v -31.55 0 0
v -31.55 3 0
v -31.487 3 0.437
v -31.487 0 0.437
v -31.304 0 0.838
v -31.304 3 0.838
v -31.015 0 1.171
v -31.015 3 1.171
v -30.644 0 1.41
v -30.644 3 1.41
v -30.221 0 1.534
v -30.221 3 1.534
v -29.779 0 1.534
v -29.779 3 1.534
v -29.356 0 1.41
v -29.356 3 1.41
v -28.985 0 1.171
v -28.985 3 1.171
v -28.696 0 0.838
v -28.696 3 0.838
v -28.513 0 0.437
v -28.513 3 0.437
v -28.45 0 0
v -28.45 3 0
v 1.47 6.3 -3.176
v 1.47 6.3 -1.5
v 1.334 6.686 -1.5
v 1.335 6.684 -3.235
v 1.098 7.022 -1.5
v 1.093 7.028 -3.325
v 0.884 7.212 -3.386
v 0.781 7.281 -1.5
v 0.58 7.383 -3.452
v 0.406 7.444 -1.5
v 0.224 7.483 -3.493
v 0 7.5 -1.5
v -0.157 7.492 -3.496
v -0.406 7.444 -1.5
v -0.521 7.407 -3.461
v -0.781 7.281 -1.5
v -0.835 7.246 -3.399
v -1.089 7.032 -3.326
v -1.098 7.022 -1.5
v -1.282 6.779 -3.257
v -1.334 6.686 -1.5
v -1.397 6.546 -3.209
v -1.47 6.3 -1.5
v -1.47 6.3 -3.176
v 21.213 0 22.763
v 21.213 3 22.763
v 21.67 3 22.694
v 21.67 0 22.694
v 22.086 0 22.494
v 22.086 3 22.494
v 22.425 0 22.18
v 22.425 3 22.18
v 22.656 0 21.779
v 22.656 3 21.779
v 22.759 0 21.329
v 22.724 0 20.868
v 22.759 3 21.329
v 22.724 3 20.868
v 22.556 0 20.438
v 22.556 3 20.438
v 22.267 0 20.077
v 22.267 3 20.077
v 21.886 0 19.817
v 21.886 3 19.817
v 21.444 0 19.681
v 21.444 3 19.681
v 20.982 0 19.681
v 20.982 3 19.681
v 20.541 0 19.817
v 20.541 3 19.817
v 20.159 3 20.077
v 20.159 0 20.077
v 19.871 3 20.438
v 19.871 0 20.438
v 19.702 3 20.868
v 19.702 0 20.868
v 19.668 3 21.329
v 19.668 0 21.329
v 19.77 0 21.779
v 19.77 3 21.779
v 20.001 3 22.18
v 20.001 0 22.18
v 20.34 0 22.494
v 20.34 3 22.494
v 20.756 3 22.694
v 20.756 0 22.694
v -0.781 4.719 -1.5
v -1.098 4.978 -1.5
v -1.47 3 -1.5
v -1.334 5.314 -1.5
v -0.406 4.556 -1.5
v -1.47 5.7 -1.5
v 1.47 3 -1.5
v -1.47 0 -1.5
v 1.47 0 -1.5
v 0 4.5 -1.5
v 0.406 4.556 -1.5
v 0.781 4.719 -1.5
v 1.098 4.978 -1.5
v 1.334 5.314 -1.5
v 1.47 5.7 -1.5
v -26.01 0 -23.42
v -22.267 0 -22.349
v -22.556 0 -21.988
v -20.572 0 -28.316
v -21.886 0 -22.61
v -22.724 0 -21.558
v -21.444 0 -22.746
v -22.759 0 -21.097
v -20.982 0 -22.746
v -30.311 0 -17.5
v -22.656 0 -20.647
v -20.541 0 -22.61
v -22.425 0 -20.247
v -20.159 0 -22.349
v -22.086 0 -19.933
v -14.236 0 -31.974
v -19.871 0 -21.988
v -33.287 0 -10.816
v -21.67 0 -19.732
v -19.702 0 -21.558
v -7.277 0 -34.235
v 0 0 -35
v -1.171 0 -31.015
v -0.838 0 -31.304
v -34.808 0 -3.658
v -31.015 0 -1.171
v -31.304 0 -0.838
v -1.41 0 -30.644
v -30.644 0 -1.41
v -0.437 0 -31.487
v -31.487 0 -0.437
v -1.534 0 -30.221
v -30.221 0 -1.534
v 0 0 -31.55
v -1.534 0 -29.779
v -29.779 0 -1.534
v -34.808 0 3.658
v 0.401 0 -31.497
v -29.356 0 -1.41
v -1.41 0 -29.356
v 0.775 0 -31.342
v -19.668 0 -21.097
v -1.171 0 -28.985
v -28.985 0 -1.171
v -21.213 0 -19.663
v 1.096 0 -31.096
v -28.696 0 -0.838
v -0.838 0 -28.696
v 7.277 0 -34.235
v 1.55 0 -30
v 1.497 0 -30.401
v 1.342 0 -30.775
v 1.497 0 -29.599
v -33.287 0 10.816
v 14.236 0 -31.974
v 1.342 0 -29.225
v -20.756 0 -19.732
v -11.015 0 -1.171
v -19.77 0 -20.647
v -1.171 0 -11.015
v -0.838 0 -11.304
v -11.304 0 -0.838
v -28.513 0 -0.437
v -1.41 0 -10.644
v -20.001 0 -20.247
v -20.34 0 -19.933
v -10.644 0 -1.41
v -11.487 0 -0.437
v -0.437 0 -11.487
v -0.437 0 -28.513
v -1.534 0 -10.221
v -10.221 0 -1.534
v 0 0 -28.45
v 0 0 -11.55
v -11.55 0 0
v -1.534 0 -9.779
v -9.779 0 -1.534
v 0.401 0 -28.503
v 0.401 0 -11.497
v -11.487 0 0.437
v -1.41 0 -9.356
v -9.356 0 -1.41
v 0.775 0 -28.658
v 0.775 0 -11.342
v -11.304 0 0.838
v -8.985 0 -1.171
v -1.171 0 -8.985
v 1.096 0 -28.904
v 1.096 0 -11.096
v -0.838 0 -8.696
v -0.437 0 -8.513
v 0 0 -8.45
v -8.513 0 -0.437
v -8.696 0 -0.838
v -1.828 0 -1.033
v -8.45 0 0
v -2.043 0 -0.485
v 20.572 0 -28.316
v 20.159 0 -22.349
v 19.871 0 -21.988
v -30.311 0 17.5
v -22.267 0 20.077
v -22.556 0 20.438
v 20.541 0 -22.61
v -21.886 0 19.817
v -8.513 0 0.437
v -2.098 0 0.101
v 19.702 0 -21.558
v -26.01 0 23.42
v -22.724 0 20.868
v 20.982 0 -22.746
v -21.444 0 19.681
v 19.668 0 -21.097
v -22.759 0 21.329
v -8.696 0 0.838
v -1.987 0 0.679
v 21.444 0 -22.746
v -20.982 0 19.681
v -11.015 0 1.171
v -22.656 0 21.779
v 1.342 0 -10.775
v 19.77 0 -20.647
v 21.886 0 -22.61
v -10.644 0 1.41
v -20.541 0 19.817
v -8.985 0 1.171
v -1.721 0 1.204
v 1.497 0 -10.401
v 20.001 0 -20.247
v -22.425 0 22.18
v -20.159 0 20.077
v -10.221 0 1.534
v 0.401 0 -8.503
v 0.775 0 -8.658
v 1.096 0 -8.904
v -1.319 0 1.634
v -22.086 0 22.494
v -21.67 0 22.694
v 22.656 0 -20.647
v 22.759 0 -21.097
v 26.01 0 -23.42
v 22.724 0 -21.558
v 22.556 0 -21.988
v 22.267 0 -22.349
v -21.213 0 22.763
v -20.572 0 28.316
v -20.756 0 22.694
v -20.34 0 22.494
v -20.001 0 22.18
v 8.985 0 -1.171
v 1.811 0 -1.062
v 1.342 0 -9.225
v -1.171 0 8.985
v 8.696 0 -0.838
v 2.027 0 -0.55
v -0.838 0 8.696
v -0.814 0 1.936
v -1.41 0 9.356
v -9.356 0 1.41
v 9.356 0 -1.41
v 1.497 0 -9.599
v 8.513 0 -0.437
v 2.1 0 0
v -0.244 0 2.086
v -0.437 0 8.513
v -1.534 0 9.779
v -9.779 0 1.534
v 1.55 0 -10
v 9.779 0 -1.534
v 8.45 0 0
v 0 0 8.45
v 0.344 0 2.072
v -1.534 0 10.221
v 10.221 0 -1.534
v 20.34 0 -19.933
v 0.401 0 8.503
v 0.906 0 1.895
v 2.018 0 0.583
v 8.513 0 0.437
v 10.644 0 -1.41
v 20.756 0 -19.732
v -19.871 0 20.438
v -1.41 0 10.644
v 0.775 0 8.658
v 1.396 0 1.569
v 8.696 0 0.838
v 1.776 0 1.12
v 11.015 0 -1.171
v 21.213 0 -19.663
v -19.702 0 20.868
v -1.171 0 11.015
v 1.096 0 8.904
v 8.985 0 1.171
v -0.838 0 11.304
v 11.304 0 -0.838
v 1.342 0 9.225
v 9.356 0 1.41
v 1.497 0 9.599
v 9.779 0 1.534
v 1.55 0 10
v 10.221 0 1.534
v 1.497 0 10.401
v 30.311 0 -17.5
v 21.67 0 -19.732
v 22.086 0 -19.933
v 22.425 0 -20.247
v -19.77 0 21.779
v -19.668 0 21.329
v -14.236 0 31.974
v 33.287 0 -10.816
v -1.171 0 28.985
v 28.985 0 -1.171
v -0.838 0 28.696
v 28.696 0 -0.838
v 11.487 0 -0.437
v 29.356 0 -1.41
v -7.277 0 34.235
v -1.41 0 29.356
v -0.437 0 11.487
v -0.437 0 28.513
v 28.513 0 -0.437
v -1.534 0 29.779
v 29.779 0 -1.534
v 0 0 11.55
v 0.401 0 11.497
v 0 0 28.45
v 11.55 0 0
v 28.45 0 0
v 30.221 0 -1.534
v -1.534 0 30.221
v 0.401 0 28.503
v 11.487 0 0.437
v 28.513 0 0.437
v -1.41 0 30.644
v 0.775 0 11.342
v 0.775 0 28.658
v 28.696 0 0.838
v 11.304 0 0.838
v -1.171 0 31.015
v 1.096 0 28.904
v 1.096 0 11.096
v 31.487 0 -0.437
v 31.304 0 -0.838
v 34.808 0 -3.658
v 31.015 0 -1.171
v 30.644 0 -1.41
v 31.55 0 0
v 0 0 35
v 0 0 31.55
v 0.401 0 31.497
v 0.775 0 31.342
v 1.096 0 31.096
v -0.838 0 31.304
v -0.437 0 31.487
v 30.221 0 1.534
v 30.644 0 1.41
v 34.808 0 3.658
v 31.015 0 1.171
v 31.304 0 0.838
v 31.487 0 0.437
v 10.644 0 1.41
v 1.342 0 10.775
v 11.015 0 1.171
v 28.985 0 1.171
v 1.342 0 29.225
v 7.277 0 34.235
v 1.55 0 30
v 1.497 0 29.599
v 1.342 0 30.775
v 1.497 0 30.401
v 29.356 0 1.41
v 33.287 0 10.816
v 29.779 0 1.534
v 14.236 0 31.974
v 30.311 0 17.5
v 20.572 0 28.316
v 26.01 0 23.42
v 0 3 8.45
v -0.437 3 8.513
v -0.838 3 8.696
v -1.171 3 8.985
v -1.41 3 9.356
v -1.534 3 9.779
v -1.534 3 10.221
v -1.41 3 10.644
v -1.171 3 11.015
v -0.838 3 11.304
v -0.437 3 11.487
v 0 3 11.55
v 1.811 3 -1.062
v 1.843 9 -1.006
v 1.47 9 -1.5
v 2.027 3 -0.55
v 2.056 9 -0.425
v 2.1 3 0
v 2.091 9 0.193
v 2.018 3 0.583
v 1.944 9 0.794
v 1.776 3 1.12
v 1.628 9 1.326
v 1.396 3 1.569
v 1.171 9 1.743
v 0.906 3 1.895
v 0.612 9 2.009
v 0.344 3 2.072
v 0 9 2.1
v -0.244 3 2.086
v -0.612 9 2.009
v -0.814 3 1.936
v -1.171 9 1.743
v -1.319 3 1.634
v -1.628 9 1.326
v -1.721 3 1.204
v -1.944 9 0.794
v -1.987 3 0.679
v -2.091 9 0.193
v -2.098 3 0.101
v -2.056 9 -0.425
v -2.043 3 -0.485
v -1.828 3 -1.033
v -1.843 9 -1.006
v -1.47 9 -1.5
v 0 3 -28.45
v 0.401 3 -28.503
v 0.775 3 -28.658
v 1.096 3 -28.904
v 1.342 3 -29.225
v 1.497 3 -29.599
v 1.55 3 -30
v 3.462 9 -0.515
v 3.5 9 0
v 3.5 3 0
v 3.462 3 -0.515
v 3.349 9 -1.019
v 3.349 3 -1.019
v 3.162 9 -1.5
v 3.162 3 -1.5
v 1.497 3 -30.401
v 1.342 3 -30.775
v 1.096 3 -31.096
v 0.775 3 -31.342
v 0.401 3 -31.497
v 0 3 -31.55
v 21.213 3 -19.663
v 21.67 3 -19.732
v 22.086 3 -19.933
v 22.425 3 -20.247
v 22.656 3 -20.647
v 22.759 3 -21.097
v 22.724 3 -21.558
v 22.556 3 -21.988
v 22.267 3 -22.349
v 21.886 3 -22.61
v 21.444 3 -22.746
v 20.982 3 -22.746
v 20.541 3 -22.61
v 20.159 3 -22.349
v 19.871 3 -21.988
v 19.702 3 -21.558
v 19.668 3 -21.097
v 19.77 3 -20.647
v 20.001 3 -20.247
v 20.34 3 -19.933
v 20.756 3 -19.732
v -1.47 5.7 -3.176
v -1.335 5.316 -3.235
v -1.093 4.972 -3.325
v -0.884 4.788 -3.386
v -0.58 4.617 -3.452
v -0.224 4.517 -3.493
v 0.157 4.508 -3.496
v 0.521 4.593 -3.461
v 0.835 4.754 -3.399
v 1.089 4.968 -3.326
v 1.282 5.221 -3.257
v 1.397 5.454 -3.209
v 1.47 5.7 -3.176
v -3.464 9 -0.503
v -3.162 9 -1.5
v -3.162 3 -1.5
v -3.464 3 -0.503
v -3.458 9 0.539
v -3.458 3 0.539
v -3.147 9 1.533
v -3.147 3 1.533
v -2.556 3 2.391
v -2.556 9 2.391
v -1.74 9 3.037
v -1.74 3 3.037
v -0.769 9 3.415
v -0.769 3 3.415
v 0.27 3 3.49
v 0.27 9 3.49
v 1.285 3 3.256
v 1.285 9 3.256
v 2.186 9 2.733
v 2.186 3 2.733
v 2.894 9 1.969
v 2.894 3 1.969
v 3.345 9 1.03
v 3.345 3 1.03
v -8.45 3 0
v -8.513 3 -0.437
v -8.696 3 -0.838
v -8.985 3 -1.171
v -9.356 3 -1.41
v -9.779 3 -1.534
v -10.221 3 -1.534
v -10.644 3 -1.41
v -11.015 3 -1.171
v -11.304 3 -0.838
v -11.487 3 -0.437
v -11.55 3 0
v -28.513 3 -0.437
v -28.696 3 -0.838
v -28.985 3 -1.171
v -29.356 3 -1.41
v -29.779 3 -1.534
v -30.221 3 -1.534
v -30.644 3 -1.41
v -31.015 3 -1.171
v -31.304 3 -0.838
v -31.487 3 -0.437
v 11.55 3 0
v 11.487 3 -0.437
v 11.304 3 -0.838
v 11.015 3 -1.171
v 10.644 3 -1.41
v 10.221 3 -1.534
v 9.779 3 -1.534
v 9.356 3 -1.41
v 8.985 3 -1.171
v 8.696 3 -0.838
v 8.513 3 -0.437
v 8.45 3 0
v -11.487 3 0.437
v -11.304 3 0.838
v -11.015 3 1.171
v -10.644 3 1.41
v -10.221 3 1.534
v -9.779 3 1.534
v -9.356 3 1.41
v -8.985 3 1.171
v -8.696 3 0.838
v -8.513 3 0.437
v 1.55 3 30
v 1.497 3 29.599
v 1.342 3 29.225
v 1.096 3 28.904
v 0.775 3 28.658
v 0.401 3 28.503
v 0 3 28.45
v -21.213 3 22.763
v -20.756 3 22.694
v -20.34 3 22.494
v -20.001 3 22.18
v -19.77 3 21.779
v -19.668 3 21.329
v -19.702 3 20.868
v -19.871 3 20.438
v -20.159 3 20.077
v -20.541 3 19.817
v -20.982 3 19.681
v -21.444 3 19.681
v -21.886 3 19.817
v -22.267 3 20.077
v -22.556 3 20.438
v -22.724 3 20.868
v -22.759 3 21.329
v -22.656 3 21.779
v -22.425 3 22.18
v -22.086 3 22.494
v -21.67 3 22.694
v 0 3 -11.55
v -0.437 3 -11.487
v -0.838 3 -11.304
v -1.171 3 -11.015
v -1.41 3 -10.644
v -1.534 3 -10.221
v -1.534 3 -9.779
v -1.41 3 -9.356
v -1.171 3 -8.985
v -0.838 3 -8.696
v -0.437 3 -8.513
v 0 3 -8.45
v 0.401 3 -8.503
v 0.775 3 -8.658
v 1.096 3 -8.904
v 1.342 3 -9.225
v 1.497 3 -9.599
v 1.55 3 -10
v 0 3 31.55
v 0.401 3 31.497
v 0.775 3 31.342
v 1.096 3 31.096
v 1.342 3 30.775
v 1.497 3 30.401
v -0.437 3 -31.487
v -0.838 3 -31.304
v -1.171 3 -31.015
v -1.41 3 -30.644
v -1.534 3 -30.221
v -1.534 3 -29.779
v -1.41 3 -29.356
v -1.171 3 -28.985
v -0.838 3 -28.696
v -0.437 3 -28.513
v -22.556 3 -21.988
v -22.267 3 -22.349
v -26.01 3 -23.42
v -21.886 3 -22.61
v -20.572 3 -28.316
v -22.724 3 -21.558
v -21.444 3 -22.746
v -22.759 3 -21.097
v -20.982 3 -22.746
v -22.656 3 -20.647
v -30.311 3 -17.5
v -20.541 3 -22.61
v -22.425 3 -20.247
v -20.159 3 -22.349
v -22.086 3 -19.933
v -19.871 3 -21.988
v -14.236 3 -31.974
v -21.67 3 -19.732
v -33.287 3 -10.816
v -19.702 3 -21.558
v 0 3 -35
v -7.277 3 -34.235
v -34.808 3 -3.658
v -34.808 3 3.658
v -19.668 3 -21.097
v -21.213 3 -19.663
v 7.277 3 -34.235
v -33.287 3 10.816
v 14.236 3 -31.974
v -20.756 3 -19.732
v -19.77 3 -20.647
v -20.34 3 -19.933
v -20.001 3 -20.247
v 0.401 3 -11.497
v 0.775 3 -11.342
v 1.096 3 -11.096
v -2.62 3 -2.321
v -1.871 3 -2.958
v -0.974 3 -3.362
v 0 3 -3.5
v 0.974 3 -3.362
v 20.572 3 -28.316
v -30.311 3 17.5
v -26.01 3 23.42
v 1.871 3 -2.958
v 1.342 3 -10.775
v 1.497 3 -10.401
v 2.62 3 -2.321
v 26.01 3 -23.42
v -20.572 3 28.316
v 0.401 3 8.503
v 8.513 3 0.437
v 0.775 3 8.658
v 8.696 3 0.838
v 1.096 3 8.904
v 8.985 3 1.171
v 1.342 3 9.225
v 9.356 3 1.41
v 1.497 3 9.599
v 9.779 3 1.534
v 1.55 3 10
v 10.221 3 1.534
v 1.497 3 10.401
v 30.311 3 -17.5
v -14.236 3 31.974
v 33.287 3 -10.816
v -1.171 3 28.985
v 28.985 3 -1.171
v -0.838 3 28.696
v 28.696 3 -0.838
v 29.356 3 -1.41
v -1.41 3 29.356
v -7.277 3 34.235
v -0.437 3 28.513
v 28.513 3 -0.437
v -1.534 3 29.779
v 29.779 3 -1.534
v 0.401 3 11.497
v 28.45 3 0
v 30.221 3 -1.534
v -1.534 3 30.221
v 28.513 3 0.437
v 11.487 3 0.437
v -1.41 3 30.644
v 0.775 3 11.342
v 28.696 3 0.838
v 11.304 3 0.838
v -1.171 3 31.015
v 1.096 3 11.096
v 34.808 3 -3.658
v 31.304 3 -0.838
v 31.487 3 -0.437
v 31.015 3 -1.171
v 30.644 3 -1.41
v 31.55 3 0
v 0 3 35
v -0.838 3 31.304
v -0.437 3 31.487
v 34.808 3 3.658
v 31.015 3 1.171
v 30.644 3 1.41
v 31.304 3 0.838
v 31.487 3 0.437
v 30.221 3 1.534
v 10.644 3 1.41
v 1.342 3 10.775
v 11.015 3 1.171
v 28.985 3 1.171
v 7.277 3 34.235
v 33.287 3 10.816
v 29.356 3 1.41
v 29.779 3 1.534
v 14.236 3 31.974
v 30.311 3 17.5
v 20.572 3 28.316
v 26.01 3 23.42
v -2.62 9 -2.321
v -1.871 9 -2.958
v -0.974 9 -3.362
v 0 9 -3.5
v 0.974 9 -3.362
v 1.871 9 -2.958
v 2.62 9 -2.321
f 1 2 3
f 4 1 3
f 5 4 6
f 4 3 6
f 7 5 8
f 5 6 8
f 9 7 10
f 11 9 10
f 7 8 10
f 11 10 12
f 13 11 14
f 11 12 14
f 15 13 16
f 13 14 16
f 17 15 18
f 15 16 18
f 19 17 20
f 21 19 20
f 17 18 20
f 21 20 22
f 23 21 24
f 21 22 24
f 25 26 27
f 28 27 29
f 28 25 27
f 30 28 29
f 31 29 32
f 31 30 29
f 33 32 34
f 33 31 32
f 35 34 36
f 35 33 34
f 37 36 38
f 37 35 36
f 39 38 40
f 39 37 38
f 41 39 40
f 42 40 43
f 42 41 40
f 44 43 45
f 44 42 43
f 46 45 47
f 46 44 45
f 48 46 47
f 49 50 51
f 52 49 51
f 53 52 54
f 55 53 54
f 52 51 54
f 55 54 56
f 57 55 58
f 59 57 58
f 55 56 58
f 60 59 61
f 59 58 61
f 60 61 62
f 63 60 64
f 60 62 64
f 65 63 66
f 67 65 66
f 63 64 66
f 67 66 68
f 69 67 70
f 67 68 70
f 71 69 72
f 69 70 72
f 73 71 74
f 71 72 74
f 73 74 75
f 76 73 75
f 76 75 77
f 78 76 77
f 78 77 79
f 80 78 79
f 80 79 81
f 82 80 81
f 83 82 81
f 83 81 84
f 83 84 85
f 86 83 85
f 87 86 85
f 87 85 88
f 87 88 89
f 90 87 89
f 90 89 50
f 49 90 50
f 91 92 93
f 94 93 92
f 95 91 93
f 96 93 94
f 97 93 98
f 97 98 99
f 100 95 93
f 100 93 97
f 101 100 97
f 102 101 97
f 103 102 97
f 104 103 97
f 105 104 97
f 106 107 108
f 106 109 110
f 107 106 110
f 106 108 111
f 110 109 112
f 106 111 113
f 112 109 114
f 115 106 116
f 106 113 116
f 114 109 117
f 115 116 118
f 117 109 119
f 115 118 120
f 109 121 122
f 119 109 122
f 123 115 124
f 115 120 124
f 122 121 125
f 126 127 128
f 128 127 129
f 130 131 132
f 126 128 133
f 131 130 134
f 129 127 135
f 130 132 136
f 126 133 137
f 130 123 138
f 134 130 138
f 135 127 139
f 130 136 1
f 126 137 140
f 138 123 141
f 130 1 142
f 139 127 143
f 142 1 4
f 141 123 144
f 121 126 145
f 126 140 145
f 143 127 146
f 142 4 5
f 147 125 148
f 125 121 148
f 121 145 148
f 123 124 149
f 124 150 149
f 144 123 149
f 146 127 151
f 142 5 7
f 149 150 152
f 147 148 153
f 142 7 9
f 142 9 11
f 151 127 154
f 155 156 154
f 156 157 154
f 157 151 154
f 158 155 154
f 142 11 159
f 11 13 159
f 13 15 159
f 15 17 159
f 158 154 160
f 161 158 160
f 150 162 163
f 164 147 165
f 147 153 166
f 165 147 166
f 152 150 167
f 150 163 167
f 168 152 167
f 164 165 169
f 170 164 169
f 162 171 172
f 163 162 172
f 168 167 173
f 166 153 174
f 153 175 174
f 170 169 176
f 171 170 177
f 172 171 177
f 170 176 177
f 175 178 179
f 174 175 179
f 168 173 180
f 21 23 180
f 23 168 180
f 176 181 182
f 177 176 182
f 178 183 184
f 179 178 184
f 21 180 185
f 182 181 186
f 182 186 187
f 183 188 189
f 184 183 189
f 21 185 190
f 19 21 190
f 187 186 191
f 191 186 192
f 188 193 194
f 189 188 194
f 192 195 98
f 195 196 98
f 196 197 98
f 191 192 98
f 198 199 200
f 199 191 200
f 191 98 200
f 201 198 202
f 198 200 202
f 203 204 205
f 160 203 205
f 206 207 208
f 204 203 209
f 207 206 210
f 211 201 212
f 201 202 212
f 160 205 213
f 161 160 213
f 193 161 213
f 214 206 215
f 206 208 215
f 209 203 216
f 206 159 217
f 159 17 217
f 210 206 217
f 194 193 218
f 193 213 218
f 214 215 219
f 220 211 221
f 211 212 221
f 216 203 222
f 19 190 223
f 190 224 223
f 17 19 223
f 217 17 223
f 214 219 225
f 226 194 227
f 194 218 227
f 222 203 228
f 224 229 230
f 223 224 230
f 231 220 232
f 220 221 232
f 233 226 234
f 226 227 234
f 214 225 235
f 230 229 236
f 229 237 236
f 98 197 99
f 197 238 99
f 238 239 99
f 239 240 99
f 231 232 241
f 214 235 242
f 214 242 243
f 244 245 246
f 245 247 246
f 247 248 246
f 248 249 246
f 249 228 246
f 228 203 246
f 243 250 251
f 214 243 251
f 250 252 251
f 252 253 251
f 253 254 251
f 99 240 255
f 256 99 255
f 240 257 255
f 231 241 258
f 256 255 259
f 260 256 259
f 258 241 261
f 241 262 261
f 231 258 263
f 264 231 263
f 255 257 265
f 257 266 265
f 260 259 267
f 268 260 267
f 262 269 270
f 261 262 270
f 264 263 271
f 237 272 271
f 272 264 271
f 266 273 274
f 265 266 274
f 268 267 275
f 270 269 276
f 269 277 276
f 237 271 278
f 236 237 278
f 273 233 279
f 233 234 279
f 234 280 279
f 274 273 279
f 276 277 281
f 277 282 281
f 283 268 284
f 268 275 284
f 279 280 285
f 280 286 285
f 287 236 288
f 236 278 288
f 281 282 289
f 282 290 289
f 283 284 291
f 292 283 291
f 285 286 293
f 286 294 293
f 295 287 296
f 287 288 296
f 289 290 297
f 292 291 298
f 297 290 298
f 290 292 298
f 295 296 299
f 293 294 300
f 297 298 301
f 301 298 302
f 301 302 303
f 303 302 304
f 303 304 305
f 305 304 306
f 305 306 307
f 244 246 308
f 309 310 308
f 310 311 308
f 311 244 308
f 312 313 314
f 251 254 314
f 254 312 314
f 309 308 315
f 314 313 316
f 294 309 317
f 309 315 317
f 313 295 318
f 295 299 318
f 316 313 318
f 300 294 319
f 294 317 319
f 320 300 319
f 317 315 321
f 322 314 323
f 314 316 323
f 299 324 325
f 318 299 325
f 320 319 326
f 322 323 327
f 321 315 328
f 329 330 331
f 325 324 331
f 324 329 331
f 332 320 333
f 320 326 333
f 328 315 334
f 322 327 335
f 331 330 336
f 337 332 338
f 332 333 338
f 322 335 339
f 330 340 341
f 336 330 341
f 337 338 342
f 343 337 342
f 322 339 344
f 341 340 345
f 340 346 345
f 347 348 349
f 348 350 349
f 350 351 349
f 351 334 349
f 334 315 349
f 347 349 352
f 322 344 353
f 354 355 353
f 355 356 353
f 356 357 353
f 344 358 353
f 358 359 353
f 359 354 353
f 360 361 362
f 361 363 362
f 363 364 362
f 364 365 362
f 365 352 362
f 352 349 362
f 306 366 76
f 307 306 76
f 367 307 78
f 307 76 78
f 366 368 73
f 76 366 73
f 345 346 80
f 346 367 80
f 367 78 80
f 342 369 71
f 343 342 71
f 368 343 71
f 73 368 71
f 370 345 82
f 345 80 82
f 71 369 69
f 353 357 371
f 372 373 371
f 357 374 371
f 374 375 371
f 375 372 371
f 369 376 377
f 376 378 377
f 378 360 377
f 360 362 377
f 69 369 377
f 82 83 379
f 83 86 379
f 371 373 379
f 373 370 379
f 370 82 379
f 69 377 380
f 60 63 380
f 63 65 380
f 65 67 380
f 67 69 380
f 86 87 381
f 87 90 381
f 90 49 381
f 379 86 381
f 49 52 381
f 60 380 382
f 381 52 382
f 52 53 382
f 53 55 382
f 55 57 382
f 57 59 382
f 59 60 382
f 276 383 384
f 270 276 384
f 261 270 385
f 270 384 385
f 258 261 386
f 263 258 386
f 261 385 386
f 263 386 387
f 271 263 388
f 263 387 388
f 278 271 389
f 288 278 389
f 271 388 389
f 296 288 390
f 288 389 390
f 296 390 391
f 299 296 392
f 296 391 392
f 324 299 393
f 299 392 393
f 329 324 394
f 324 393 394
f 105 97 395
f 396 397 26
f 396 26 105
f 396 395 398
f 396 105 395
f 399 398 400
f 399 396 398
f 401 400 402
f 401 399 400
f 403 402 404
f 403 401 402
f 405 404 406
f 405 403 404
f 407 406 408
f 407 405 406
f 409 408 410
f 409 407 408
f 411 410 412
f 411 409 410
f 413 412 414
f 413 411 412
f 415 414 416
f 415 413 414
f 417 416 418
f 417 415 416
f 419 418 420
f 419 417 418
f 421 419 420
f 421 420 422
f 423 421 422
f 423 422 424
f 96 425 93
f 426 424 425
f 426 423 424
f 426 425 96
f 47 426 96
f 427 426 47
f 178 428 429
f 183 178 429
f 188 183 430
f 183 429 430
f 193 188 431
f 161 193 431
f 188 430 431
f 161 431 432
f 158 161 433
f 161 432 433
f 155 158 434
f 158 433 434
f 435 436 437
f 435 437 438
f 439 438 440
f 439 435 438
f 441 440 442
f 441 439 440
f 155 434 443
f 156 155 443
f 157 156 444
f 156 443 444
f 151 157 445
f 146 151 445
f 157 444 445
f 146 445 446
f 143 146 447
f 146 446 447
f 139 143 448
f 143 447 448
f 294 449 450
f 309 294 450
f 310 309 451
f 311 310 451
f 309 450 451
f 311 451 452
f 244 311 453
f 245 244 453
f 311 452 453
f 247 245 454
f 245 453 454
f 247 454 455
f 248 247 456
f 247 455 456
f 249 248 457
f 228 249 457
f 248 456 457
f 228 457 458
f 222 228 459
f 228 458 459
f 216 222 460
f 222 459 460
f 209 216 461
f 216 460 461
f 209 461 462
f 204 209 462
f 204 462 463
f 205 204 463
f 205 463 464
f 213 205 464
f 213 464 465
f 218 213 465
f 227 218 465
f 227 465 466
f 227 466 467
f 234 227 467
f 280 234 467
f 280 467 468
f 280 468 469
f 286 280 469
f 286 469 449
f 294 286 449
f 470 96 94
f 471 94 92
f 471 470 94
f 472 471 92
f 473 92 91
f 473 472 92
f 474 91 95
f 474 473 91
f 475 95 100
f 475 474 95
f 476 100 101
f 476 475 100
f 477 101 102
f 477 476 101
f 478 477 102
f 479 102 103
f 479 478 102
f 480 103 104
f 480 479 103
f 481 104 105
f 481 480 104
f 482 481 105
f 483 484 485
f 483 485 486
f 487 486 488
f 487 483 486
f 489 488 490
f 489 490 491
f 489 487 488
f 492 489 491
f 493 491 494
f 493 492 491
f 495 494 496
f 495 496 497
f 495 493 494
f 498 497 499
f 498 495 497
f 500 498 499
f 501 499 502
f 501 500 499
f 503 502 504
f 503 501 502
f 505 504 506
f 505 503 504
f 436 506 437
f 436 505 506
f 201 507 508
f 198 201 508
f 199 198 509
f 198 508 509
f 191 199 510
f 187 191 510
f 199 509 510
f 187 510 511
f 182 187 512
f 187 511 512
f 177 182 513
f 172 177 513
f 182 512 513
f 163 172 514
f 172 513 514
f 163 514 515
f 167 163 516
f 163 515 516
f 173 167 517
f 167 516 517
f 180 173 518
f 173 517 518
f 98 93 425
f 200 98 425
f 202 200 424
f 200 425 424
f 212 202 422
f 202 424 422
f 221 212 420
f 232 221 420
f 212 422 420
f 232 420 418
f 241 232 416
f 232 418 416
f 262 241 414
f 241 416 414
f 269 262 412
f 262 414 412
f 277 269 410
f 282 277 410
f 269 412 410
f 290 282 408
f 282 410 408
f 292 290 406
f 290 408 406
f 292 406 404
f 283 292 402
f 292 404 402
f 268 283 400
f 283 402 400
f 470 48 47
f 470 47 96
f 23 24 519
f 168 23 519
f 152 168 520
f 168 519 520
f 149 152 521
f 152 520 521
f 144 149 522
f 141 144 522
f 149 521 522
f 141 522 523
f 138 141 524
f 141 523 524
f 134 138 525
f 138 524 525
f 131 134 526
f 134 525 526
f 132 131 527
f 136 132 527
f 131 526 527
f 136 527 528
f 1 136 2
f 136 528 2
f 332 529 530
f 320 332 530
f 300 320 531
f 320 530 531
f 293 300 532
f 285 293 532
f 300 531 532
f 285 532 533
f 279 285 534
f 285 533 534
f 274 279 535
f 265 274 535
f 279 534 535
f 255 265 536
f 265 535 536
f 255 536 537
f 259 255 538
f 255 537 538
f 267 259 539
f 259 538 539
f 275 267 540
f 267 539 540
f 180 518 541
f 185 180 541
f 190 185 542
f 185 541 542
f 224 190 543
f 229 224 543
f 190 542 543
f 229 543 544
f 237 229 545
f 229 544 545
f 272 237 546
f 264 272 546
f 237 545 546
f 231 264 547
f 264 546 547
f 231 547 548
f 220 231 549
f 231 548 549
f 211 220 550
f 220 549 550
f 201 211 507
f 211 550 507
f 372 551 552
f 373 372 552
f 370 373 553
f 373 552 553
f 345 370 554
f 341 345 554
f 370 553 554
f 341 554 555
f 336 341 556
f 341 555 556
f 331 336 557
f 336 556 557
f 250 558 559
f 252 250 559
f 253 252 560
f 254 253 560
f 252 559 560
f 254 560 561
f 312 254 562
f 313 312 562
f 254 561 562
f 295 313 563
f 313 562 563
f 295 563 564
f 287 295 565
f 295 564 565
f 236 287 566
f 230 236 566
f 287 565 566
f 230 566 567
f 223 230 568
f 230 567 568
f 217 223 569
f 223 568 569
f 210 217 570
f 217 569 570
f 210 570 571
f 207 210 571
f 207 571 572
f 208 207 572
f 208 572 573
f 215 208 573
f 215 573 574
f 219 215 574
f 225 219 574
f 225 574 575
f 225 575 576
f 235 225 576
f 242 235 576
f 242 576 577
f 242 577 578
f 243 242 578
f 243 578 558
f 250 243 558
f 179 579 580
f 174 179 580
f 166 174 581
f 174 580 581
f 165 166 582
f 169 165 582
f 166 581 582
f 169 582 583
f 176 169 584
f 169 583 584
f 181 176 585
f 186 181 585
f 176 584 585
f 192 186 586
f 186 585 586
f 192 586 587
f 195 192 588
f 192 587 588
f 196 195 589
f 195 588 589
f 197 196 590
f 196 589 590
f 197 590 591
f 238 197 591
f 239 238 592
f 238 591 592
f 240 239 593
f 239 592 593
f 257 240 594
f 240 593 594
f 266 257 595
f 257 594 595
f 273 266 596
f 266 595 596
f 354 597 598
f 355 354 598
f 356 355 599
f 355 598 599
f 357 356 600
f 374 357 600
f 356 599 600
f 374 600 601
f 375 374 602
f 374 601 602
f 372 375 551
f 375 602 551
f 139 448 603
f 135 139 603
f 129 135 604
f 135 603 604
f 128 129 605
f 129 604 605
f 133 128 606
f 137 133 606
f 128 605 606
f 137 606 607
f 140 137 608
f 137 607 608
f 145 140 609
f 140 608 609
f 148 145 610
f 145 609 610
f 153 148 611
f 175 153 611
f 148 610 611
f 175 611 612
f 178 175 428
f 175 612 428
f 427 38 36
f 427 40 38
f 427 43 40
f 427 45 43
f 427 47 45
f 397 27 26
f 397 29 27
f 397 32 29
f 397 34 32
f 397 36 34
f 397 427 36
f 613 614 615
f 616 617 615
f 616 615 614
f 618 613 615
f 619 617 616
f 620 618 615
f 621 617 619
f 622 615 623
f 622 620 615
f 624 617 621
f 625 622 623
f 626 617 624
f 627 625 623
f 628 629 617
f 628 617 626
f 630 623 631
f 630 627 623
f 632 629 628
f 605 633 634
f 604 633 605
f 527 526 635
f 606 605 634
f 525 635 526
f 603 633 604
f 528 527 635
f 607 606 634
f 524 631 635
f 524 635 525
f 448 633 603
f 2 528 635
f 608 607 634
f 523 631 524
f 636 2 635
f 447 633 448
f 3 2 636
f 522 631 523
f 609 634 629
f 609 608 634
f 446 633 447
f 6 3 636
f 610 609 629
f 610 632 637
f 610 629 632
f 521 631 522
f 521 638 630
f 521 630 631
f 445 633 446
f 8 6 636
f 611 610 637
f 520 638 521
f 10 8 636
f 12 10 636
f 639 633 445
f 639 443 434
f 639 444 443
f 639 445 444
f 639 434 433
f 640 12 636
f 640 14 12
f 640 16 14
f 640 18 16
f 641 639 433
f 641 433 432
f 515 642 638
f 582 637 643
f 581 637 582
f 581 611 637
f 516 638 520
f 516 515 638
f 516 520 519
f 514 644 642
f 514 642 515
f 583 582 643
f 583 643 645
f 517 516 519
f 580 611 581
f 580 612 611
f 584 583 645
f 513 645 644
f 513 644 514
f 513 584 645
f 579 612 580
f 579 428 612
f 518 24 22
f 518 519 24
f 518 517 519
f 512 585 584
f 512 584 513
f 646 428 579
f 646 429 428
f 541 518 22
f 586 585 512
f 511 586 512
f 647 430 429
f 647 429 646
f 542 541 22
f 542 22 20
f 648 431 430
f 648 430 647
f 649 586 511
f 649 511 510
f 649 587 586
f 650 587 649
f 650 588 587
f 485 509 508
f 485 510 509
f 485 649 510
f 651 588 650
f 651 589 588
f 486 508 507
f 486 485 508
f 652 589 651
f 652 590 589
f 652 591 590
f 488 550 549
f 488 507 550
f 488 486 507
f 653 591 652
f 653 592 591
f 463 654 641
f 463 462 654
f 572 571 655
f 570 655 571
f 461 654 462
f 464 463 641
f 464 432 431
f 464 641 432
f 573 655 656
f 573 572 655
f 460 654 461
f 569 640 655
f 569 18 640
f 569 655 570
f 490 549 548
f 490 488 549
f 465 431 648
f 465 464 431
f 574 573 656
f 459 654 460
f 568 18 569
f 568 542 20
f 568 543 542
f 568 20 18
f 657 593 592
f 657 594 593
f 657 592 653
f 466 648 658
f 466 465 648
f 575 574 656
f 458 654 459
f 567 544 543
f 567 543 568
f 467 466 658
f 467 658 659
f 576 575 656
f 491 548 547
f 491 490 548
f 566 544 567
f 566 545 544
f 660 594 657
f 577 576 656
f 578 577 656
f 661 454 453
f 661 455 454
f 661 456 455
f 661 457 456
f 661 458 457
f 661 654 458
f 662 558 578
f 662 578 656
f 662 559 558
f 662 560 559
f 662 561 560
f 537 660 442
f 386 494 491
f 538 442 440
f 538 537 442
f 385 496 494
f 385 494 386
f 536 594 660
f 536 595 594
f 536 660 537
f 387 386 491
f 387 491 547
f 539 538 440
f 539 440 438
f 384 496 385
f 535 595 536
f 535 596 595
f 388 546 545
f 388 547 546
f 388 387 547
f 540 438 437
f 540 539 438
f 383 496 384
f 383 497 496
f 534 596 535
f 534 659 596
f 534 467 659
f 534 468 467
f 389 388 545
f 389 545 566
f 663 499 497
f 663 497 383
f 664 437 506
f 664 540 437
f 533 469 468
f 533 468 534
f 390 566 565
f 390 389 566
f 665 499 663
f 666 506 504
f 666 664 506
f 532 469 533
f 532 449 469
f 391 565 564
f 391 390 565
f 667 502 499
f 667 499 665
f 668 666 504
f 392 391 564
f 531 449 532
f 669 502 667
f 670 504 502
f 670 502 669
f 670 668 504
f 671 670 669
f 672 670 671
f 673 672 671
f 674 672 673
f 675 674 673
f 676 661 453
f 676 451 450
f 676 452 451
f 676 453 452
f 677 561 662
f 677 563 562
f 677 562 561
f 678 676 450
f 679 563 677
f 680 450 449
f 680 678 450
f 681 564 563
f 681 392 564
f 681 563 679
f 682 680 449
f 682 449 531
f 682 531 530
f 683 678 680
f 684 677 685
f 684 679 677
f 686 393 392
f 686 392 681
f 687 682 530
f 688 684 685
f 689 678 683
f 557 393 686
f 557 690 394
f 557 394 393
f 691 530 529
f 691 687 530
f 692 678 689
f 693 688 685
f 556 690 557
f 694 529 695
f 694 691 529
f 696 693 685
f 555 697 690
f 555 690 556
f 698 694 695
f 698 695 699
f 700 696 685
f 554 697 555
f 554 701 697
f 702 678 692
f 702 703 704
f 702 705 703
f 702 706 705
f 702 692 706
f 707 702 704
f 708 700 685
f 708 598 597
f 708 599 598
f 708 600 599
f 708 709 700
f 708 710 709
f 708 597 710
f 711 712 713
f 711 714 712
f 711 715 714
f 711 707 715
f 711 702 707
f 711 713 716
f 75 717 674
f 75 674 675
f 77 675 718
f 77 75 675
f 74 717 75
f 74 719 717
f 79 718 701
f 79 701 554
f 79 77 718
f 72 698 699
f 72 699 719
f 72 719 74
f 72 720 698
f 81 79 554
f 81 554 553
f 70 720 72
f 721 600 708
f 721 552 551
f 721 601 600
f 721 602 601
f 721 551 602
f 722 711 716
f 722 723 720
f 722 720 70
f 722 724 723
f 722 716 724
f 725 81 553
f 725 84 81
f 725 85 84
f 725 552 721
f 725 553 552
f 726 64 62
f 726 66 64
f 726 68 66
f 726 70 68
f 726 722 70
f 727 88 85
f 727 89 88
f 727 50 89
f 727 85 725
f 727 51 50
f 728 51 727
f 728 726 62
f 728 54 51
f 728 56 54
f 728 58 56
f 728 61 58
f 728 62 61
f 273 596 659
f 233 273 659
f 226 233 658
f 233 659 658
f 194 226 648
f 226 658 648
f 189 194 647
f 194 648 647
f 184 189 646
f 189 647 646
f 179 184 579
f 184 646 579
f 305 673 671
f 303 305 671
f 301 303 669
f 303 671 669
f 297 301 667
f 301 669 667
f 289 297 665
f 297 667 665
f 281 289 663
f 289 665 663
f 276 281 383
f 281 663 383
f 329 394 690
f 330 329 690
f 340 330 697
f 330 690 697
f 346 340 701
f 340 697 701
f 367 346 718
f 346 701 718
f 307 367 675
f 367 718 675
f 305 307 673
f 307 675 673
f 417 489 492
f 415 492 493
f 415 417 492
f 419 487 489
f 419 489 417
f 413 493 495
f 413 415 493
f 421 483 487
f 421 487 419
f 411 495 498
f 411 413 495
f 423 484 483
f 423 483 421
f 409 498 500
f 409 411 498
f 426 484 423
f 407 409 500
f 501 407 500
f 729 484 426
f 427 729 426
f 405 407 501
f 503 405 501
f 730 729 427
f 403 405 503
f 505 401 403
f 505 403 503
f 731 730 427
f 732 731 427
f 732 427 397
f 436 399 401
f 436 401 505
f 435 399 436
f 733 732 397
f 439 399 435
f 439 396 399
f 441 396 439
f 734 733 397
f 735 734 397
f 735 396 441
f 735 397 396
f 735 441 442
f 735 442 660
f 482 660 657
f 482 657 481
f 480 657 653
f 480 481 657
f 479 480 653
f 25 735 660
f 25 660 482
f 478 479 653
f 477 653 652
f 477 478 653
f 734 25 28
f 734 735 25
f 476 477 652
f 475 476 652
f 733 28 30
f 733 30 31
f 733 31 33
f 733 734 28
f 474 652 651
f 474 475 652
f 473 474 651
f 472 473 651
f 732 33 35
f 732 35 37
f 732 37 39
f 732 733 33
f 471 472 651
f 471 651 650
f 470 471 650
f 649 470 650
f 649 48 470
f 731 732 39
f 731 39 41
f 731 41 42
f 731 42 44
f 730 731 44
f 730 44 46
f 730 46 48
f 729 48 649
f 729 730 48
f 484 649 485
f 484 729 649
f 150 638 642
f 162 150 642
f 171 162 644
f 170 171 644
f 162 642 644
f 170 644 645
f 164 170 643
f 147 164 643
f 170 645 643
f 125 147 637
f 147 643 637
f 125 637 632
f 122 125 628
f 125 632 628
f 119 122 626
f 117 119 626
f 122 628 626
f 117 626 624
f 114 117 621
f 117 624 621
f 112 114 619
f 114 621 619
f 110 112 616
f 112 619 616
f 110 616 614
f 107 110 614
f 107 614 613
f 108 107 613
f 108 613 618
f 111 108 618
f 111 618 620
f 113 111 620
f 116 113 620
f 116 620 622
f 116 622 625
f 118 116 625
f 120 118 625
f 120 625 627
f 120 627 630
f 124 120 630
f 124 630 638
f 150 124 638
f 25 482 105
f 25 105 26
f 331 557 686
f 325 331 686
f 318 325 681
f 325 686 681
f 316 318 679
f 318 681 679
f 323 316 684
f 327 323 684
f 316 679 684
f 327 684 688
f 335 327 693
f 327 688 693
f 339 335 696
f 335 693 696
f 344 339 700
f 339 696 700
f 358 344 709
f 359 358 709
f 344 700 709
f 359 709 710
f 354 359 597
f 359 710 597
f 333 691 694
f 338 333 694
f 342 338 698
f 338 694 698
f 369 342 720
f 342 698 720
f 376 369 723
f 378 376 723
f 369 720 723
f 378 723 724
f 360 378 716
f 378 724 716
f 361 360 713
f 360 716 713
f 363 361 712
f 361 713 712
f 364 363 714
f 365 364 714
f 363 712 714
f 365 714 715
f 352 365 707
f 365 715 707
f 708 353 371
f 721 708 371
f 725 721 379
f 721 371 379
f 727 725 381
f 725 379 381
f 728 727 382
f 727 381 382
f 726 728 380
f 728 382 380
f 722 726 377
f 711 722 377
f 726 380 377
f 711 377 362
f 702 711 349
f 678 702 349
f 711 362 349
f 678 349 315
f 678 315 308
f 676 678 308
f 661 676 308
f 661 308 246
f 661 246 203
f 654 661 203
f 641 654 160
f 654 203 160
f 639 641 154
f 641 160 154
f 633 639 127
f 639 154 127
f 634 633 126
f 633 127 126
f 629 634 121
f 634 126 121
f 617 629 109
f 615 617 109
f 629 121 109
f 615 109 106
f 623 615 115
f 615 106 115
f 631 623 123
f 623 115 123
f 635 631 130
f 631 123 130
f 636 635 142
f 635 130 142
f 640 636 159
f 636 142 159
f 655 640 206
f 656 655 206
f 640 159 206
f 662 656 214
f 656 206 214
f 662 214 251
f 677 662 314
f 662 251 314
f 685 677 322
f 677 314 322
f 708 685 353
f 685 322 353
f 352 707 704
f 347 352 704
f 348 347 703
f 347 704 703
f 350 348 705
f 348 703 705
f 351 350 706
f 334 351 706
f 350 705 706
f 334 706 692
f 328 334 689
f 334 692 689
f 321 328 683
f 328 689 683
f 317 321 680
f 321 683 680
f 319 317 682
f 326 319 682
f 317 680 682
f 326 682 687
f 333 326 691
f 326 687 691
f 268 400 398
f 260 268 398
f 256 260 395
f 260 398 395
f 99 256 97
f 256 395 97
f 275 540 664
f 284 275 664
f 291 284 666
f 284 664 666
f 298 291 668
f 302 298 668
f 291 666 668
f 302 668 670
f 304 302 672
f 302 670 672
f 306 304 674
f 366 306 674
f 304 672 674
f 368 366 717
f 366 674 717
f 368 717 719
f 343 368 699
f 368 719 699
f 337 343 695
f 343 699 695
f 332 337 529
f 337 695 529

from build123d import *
from build123d.topology import SkipClean

# Parameters (mm, degrees)
SKETCH_1_R          = 35
EXTRUDE_1_DEPTH     = 3
CUT_EXTRUDE_1_DEPTH = 3
EXTRUDE_START       = 6
SKETCH_3_R          = 3.5
EXTRUDE_2_DEPTH     = 6
CUT_EXTRUDE_2_DEPTH = 6
SKETCH_5_R          = 1.55
CUT_EXTRUDE_3_DEPTH = 6


with BuildPart() as part:
    # 草图1 → 凸台-拉伸1 (new body)
    with BuildSketch(Plane(origin=(0, 0, 0), x_dir=(1, 0, 0), z_dir=(0, 1, 0))):
        Circle(SKETCH_1_R)
    extrude(amount=EXTRUDE_1_DEPTH)

    # 草图2 → 切除-拉伸1 (cut)
    with BuildSketch(Plane(origin=(0, 3, 0), x_dir=(1, 0, 0), z_dir=(0, 1, 0))):
        with BuildLine():
            Line((0, 1.5), (-1.469693846, 1.5))
            ThreePointArc((-1.469693846, 1.5), (-0.8135241, -1.936021317), (2.1, 0))
            ThreePointArc((2.1, 0), (1.936021317, 0.8135241), (1.469693846, 1.5))
            Line((1.469693846, 1.5), (0, 1.5))
        make_face()
    extrude(amount=-CUT_EXTRUDE_1_DEPTH, mode=Mode.SUBTRACT)

    # 草图3 → 凸台-拉伸2 (add)
    with BuildSketch(Plane(origin=(0, 3, 0), x_dir=(1, 0, 0), z_dir=(0, 1, 0)).offset(EXTRUDE_START)):
        Circle(SKETCH_3_R)
        with BuildLine():
            ThreePointArc((1.469693846, 1.5), (0, -2.1), (-1.469693846, 1.5))
            Line((-1.469693846, 1.5), (1.469693846, 1.5))
        make_face(mode=Mode.SUBTRACT)
    extrude(amount=-EXTRUDE_2_DEPTH)

    # 草图4 → 切除-拉伸2 (cut)
    with BuildSketch(Plane.XY.offset(-1.5)):
        with BuildLine():
            Line((1.469693846, 5.7), (1.469693846, 6.3))
            ThreePointArc((1.469693846, 6.3), (0.948683298, 7.161895004), (0, 7.5))
            ThreePointArc((0, 7.5), (-0.948683298, 7.161895004), (-1.469693846, 6.3))
            Line((-1.469693846, 6.3), (-1.469693846, 5.7))
            ThreePointArc((-1.469693846, 5.7), (0, 4.5), (1.469693846, 5.7))
        make_face()
    extrude(amount=-CUT_EXTRUDE_2_DEPTH, mode=Mode.SUBTRACT)

    # 草图5 → 切除-拉伸3 (cut)
    with SkipClean():  # the faces are left unmerged after this step: merging them gives an invalid solid
        with BuildSketch(Plane(origin=(0, 3, 0), x_dir=(1, 0, 0), z_dir=(0, 1, 0))):
            with Locations((0, 30)):
                Circle(SKETCH_5_R)
            with Locations((0, 10)):
                Circle(SKETCH_5_R)
            with Locations((30, 0)):
                Circle(SKETCH_5_R)
            with Locations((10, 0)):
                Circle(SKETCH_5_R)
            with Locations((0, -30)):
                Circle(SKETCH_5_R)
            with Locations((0, -10)):
                Circle(SKETCH_5_R)
            with Locations((-10, 0)):
                Circle(SKETCH_5_R)
            with Locations((-30, 0)):
                Circle(SKETCH_5_R)
            with Locations((21.213203436, 21.213203436)):
                Circle(SKETCH_5_R)
            with Locations((21.213203436, -21.213203436)):
                Circle(SKETCH_5_R)
            with Locations((-21.213203436, -21.213203436)):
                Circle(SKETCH_5_R)
            with Locations((-21.213203436, 21.213203436)):
                Circle(SKETCH_5_R)
        extrude(amount=-CUT_EXTRUDE_3_DEPTH, mode=Mode.SUBTRACT)


solid = part.part
